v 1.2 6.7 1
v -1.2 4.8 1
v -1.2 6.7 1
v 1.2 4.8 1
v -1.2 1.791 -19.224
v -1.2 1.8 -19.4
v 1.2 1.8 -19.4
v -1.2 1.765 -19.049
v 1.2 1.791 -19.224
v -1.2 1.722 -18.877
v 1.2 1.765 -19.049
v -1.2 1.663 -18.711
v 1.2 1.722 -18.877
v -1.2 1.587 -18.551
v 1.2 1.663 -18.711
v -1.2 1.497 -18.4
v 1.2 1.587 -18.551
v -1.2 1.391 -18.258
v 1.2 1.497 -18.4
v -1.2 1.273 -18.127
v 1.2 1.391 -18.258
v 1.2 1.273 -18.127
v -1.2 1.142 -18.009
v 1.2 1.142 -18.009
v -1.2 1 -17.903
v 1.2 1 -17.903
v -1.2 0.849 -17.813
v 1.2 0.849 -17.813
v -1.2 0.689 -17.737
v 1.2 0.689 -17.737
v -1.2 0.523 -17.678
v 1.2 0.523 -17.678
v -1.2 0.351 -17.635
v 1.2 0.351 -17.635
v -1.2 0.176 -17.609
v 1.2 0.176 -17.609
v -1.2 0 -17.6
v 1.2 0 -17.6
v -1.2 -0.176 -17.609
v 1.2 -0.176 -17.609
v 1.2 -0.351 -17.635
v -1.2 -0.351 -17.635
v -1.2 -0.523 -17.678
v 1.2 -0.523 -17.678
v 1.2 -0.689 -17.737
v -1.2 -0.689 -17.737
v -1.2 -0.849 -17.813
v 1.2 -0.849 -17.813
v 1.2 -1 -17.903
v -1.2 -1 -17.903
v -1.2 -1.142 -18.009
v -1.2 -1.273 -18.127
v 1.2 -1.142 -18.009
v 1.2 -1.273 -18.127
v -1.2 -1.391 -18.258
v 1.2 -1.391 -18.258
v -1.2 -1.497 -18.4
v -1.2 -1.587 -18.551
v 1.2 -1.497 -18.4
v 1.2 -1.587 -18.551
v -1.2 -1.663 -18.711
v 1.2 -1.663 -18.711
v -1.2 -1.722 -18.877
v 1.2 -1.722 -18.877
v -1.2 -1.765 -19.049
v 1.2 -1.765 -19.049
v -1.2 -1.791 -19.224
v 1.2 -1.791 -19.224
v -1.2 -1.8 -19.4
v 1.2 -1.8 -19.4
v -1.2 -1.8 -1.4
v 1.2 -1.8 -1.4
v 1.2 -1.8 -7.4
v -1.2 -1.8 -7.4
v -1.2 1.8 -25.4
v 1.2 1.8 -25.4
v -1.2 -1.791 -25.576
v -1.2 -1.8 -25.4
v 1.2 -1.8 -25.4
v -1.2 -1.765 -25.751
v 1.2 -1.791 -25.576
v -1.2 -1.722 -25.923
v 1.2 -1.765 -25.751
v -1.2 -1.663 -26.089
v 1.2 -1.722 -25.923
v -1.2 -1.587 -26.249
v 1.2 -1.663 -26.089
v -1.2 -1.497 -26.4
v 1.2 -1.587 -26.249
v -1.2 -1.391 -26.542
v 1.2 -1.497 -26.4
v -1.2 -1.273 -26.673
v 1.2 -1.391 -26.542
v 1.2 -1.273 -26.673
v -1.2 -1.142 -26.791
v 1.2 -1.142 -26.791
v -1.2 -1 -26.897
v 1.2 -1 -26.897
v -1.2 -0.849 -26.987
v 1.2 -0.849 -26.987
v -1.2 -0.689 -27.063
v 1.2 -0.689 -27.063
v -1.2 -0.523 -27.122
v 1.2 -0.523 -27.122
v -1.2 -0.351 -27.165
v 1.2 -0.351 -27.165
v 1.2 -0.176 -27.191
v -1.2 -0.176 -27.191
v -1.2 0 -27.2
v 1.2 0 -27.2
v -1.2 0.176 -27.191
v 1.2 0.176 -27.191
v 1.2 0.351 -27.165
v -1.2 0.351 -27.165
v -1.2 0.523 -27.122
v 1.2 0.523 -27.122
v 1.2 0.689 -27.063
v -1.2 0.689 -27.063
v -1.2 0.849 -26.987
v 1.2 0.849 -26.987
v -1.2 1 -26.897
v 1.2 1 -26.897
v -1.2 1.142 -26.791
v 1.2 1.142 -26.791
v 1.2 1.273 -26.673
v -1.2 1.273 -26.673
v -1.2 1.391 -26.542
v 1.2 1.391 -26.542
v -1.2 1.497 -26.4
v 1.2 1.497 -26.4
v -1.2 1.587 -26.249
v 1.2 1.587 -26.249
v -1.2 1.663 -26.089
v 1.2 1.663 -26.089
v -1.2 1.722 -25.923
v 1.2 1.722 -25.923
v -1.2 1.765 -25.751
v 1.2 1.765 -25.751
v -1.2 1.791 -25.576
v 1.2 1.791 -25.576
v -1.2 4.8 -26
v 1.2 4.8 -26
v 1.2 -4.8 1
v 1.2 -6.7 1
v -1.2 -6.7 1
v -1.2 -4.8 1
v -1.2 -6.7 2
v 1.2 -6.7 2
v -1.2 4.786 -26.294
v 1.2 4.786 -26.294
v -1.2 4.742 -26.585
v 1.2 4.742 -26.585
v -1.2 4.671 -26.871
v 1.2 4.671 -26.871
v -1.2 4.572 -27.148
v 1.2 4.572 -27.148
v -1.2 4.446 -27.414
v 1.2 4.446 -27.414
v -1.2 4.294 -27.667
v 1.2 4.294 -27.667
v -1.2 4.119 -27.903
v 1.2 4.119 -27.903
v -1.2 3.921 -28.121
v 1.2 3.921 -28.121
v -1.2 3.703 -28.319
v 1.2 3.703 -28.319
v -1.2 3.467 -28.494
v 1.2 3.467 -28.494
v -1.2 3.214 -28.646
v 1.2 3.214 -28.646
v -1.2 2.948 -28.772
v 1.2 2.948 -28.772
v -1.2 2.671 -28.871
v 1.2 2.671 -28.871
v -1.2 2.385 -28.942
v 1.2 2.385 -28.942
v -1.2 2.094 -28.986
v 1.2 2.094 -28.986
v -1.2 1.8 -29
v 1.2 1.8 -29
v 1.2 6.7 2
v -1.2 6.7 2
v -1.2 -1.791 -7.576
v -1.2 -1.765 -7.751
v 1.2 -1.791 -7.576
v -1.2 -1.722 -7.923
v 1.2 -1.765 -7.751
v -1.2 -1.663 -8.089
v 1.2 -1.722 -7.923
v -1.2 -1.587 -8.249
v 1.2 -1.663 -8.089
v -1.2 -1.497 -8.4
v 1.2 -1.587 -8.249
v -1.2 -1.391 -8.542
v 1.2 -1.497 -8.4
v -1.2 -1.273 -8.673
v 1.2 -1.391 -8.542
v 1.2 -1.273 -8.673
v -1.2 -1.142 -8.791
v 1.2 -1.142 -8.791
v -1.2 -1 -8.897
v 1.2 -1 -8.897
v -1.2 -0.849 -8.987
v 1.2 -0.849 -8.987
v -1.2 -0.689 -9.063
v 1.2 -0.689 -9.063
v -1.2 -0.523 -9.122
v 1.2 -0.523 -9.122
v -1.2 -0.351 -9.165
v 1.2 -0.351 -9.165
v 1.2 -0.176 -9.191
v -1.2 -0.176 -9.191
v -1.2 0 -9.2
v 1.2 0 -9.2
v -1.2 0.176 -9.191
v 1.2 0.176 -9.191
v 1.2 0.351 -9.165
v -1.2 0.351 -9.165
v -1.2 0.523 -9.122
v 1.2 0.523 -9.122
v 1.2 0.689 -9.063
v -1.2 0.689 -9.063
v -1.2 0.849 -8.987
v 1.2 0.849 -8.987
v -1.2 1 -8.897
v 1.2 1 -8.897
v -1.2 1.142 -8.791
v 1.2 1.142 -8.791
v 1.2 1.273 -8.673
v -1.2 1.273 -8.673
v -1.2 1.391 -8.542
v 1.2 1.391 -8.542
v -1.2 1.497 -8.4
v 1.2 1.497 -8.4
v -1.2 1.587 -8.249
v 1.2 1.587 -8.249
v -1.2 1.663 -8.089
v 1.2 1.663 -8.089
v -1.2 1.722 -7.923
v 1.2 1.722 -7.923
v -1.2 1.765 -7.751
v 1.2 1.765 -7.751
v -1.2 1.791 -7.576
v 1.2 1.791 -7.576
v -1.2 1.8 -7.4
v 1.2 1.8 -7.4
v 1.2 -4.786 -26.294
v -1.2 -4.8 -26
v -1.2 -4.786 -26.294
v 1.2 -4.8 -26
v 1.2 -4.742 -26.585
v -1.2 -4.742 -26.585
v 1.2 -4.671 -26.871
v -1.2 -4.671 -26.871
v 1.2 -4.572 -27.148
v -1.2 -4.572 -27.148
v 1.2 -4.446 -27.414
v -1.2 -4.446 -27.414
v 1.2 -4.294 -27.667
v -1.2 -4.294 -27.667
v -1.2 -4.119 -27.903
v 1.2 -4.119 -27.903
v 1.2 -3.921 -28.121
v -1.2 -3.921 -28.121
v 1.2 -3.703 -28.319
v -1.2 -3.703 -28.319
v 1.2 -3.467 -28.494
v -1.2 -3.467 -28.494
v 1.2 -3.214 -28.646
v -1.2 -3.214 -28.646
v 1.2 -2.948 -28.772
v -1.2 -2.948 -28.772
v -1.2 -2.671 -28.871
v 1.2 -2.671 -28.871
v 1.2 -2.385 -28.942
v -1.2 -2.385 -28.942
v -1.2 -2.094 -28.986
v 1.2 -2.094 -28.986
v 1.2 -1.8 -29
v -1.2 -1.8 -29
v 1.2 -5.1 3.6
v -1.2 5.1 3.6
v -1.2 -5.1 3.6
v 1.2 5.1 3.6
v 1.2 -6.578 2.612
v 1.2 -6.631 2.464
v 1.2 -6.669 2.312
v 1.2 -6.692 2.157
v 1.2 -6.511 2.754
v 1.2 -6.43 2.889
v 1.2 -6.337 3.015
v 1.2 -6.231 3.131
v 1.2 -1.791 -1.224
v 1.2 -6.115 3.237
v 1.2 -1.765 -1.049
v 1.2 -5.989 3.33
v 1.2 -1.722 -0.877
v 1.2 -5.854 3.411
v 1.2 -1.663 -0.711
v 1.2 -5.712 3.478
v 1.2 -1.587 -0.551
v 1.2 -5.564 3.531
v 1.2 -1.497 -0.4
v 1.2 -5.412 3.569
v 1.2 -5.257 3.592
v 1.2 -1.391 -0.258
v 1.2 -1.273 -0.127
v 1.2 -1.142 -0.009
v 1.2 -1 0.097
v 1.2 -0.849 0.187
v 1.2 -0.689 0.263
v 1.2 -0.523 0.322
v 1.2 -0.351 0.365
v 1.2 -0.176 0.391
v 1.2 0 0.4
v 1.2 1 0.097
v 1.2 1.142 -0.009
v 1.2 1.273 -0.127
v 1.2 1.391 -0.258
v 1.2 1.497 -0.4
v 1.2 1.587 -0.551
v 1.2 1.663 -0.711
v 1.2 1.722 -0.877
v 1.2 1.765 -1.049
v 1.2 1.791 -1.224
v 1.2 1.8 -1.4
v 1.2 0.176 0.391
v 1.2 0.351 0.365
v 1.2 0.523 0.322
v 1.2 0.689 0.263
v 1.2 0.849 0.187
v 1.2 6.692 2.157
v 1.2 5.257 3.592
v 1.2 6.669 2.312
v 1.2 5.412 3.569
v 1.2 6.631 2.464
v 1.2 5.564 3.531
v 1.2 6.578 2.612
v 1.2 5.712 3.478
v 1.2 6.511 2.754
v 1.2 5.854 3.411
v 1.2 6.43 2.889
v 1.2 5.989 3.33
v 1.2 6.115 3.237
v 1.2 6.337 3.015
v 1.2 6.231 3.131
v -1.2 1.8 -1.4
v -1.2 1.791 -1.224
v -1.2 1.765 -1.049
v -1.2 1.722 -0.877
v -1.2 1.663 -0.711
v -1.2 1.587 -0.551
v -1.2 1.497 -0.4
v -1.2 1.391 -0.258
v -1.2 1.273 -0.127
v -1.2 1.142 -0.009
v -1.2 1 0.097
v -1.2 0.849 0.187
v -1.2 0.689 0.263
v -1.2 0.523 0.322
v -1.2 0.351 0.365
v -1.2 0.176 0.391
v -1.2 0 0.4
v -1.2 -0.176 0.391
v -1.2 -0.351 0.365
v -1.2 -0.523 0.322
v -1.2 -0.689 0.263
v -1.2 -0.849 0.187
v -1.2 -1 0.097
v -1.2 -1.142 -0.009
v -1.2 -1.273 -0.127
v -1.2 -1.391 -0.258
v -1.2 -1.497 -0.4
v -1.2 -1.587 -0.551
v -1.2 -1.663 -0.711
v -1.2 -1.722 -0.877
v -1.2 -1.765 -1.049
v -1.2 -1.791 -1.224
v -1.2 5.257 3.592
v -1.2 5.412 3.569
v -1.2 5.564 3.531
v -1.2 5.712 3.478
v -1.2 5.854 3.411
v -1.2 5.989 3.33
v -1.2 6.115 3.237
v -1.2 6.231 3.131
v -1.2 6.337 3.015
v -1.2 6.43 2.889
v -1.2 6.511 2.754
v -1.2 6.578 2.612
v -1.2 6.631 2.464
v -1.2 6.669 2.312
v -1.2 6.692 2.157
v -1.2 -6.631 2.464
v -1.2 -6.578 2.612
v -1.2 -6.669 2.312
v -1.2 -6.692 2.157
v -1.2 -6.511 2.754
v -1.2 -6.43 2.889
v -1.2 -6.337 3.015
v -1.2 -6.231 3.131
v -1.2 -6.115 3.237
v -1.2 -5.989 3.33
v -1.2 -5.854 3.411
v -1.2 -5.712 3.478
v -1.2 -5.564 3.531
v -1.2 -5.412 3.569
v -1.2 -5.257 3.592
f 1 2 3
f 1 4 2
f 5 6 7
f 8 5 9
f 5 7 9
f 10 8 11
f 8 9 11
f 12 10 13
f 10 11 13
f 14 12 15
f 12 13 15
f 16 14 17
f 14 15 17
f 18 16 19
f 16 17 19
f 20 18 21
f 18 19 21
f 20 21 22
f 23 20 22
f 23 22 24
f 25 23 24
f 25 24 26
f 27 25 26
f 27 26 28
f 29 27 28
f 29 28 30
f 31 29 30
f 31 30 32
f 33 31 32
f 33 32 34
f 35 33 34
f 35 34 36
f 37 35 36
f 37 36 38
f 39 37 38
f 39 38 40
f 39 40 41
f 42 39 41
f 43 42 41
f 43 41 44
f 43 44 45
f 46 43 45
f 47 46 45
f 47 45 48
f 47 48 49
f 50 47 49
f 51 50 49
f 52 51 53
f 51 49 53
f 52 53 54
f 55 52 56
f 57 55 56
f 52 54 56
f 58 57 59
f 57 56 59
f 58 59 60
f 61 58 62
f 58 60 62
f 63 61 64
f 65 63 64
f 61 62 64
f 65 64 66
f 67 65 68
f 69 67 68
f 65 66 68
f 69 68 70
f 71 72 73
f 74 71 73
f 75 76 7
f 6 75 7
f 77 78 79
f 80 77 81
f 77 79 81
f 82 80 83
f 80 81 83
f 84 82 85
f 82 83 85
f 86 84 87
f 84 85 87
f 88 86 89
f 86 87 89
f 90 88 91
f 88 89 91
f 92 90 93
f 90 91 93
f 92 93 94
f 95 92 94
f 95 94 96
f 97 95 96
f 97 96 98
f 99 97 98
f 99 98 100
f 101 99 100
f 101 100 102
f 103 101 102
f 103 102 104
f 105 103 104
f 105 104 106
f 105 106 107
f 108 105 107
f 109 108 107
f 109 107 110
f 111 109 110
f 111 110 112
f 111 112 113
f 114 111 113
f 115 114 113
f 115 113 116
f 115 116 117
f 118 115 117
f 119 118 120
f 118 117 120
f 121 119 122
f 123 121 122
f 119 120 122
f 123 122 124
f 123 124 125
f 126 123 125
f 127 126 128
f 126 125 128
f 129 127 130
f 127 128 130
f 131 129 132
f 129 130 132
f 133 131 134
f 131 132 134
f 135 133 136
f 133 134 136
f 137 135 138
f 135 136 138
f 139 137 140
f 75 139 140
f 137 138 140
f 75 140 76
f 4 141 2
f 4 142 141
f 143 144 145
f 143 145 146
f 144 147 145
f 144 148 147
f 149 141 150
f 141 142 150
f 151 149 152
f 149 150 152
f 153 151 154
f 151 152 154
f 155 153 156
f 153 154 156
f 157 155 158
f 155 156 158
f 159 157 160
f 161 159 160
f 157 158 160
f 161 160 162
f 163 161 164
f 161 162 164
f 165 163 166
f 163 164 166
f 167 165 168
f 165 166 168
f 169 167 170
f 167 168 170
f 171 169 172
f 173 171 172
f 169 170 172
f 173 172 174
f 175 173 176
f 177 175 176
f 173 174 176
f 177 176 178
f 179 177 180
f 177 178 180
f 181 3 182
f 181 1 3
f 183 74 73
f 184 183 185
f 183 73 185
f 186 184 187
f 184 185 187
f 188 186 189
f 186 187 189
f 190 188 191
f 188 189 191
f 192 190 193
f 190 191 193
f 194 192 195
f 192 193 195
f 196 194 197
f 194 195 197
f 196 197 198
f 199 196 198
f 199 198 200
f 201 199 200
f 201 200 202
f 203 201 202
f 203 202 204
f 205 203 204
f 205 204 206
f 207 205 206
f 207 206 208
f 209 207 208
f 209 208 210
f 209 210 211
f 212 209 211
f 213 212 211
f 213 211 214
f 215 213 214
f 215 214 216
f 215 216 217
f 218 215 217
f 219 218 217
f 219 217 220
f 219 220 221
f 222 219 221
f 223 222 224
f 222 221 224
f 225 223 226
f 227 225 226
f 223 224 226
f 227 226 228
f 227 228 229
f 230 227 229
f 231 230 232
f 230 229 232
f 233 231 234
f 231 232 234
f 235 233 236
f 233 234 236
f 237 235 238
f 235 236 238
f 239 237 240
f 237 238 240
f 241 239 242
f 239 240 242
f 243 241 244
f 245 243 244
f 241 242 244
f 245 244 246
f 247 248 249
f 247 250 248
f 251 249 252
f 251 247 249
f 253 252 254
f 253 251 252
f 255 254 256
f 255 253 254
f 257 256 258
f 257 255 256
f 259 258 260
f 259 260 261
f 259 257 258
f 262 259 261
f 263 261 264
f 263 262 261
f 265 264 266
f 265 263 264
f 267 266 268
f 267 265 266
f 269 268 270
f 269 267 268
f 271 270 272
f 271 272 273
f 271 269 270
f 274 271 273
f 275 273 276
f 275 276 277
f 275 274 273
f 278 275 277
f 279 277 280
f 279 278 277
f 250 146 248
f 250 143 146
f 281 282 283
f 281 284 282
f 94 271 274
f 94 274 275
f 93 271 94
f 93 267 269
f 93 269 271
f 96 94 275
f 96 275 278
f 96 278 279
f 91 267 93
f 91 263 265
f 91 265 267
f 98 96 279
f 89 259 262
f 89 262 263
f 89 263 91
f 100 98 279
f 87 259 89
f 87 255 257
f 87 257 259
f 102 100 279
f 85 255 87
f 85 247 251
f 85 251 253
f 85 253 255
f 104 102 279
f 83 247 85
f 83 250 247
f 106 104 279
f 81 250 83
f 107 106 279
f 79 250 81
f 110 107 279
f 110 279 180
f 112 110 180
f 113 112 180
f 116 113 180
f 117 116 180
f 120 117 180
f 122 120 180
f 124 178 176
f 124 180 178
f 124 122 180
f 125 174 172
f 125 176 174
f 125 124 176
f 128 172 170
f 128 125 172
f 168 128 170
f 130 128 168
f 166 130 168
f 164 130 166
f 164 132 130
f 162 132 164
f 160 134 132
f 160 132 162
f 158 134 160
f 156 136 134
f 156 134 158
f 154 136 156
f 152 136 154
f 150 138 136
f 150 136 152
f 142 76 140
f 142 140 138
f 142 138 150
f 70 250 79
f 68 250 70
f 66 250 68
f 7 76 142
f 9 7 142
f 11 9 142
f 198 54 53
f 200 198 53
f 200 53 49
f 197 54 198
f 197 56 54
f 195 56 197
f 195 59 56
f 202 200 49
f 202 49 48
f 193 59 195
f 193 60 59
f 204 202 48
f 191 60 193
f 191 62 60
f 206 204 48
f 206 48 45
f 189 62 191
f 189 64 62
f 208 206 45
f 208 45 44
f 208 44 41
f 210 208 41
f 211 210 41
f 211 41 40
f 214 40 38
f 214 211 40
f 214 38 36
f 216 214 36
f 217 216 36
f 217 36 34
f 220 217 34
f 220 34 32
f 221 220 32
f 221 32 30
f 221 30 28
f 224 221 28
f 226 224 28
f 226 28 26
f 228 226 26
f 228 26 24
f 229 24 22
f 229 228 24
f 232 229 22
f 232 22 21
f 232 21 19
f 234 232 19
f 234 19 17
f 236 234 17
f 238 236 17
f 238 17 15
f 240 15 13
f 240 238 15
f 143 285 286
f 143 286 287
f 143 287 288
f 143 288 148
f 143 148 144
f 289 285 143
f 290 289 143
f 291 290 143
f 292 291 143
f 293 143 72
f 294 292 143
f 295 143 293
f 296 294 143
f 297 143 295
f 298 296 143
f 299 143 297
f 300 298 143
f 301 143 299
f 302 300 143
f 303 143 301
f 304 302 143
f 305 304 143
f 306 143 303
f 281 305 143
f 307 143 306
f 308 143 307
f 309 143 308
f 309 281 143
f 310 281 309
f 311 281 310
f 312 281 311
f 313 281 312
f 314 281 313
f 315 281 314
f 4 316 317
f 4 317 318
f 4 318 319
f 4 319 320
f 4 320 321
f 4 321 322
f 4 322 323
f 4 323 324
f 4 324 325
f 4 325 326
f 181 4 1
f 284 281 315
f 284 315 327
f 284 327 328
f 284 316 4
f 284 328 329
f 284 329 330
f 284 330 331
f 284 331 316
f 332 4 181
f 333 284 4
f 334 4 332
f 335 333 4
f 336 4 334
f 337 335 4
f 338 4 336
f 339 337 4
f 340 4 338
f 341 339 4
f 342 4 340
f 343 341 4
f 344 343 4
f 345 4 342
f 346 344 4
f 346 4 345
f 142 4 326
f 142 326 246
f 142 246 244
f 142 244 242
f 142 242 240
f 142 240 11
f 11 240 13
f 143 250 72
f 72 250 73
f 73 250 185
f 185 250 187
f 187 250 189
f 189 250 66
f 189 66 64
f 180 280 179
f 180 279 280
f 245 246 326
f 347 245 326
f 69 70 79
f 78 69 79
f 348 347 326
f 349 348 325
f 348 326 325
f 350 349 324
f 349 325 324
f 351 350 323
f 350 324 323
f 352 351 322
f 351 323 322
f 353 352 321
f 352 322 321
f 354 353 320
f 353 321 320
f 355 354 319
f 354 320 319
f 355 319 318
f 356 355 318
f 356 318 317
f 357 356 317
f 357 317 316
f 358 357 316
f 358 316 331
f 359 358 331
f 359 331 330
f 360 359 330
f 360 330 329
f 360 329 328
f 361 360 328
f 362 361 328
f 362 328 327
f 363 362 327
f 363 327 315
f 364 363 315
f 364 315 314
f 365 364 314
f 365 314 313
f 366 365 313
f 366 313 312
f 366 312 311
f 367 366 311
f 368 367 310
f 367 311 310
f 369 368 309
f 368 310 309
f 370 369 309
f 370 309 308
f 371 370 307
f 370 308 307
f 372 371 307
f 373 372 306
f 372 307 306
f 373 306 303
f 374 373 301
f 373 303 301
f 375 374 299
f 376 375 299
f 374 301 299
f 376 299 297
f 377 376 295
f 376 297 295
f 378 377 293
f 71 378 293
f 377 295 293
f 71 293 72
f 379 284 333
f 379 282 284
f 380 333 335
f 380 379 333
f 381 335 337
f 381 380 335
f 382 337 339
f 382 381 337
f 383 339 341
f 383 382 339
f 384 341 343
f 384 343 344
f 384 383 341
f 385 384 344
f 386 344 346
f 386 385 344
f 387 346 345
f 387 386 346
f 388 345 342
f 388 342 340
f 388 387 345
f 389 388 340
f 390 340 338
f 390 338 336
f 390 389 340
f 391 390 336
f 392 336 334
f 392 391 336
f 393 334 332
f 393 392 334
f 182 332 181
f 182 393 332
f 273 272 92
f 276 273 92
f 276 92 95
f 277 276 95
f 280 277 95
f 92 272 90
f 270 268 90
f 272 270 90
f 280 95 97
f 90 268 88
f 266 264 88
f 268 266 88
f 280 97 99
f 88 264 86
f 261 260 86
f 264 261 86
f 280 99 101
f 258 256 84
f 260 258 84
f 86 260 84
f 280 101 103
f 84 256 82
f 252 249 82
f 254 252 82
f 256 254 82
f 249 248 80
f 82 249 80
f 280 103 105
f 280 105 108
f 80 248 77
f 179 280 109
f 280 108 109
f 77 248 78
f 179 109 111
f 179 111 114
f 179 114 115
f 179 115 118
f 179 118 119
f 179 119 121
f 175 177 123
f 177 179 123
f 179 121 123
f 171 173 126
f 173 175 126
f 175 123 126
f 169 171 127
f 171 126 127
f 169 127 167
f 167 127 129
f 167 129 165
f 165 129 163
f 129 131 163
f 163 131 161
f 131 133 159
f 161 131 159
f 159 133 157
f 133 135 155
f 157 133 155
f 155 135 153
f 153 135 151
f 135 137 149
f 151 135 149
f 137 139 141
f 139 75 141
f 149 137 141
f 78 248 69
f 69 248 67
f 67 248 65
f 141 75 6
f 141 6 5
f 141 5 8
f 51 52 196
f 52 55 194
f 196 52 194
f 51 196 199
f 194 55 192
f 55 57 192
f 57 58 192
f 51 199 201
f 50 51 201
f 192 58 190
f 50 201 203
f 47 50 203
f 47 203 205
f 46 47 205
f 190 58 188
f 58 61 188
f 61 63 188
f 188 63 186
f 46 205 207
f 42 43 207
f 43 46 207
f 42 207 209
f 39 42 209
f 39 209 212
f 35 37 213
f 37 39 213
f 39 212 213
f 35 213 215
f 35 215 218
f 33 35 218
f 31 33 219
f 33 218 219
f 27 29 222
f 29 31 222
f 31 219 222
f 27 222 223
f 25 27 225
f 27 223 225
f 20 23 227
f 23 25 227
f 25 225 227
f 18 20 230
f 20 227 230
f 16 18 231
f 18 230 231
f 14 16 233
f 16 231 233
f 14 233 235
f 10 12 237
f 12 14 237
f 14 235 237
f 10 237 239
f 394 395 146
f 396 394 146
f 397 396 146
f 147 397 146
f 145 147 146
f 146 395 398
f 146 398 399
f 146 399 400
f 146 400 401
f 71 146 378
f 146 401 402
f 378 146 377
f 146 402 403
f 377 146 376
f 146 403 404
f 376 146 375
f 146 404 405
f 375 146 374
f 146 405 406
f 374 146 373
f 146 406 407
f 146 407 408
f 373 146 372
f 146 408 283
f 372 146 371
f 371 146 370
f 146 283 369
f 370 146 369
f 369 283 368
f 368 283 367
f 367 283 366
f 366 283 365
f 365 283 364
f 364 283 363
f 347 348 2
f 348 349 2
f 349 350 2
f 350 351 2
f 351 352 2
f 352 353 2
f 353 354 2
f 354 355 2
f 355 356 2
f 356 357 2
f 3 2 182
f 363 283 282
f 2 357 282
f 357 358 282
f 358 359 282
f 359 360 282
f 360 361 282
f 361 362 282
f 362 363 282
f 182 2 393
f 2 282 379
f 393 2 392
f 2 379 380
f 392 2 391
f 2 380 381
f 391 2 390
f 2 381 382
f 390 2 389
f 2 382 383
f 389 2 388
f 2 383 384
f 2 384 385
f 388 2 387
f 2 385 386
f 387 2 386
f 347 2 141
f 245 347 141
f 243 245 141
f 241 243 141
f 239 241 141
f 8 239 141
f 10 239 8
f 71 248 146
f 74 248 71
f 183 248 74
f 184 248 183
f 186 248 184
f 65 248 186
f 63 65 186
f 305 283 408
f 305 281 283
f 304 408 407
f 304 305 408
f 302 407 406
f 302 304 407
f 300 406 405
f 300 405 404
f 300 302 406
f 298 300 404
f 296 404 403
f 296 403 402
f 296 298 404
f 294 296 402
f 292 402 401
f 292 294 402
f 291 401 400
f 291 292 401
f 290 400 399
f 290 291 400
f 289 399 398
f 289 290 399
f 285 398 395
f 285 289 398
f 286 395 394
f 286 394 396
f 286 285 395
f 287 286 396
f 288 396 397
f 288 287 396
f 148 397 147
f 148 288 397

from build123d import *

# Parameters (mm, degrees)
F2_DEPTH      = 1.2
F3_DEPTH      = 1.201
F3_DEPTH_BACK = 1.201
F4_R          = 1.6
F5_R          = 3


with BuildPart() as f2:
    # F0 (on Right) → F2 (new body, symmetric)
    with BuildSketch(Plane.YZ):
        Polygon((6.7, 3.6), (-6.7, 3.6), (-6.7, 1), (-4.8, 1), (-4.8, -29), (4.8, -29), (4.8, 1), (6.7, 1), align=None)
    extrude(amount=F2_DEPTH, both=True)

    # F1 (on Right) → F3 (cut, two sides)
    with BuildSketch(Plane.YZ) as f3_sk:
        with BuildLine():
            Line((1.8, -7.4), (1.8, -1.4))
            ThreePointArc((1.8, -1.4), (0, 0.4), (-1.8, -1.4))
            Line((-1.8, -1.4), (-1.8, -7.4))
            ThreePointArc((-1.8, -7.4), (0, -9.2), (1.8, -7.4))
        make_face()
        with BuildLine():
            Line((1.8, -25.4), (1.8, -19.4))
            ThreePointArc((1.8, -19.4), (0, -17.6), (-1.8, -19.4))
            Line((-1.8, -19.4), (-1.8, -25.4))
            ThreePointArc((-1.8, -25.4), (0, -27.2), (1.8, -25.4))
        make_face()
    extrude(amount=-F3_DEPTH, mode=Mode.SUBTRACT)
    extrude(f3_sk.sketch, amount=F3_DEPTH_BACK, mode=Mode.SUBTRACT)

    # F4
    f4_edges = [f2.edges().sort_by_distance(p)[0] for p in [
        (0, 6.7, 3.6),
        (0, -6.7, 3.6),
    ]]
    fillet(f4_edges, radius=F4_R)

    # F5
    f5_edges = [f2.edges().sort_by_distance(p)[0] for p in [
        (0, 4.8, -29),
        (0, -4.8, -29),
    ]]
    fillet(f5_edges, radius=F5_R)


solid = f2.part
